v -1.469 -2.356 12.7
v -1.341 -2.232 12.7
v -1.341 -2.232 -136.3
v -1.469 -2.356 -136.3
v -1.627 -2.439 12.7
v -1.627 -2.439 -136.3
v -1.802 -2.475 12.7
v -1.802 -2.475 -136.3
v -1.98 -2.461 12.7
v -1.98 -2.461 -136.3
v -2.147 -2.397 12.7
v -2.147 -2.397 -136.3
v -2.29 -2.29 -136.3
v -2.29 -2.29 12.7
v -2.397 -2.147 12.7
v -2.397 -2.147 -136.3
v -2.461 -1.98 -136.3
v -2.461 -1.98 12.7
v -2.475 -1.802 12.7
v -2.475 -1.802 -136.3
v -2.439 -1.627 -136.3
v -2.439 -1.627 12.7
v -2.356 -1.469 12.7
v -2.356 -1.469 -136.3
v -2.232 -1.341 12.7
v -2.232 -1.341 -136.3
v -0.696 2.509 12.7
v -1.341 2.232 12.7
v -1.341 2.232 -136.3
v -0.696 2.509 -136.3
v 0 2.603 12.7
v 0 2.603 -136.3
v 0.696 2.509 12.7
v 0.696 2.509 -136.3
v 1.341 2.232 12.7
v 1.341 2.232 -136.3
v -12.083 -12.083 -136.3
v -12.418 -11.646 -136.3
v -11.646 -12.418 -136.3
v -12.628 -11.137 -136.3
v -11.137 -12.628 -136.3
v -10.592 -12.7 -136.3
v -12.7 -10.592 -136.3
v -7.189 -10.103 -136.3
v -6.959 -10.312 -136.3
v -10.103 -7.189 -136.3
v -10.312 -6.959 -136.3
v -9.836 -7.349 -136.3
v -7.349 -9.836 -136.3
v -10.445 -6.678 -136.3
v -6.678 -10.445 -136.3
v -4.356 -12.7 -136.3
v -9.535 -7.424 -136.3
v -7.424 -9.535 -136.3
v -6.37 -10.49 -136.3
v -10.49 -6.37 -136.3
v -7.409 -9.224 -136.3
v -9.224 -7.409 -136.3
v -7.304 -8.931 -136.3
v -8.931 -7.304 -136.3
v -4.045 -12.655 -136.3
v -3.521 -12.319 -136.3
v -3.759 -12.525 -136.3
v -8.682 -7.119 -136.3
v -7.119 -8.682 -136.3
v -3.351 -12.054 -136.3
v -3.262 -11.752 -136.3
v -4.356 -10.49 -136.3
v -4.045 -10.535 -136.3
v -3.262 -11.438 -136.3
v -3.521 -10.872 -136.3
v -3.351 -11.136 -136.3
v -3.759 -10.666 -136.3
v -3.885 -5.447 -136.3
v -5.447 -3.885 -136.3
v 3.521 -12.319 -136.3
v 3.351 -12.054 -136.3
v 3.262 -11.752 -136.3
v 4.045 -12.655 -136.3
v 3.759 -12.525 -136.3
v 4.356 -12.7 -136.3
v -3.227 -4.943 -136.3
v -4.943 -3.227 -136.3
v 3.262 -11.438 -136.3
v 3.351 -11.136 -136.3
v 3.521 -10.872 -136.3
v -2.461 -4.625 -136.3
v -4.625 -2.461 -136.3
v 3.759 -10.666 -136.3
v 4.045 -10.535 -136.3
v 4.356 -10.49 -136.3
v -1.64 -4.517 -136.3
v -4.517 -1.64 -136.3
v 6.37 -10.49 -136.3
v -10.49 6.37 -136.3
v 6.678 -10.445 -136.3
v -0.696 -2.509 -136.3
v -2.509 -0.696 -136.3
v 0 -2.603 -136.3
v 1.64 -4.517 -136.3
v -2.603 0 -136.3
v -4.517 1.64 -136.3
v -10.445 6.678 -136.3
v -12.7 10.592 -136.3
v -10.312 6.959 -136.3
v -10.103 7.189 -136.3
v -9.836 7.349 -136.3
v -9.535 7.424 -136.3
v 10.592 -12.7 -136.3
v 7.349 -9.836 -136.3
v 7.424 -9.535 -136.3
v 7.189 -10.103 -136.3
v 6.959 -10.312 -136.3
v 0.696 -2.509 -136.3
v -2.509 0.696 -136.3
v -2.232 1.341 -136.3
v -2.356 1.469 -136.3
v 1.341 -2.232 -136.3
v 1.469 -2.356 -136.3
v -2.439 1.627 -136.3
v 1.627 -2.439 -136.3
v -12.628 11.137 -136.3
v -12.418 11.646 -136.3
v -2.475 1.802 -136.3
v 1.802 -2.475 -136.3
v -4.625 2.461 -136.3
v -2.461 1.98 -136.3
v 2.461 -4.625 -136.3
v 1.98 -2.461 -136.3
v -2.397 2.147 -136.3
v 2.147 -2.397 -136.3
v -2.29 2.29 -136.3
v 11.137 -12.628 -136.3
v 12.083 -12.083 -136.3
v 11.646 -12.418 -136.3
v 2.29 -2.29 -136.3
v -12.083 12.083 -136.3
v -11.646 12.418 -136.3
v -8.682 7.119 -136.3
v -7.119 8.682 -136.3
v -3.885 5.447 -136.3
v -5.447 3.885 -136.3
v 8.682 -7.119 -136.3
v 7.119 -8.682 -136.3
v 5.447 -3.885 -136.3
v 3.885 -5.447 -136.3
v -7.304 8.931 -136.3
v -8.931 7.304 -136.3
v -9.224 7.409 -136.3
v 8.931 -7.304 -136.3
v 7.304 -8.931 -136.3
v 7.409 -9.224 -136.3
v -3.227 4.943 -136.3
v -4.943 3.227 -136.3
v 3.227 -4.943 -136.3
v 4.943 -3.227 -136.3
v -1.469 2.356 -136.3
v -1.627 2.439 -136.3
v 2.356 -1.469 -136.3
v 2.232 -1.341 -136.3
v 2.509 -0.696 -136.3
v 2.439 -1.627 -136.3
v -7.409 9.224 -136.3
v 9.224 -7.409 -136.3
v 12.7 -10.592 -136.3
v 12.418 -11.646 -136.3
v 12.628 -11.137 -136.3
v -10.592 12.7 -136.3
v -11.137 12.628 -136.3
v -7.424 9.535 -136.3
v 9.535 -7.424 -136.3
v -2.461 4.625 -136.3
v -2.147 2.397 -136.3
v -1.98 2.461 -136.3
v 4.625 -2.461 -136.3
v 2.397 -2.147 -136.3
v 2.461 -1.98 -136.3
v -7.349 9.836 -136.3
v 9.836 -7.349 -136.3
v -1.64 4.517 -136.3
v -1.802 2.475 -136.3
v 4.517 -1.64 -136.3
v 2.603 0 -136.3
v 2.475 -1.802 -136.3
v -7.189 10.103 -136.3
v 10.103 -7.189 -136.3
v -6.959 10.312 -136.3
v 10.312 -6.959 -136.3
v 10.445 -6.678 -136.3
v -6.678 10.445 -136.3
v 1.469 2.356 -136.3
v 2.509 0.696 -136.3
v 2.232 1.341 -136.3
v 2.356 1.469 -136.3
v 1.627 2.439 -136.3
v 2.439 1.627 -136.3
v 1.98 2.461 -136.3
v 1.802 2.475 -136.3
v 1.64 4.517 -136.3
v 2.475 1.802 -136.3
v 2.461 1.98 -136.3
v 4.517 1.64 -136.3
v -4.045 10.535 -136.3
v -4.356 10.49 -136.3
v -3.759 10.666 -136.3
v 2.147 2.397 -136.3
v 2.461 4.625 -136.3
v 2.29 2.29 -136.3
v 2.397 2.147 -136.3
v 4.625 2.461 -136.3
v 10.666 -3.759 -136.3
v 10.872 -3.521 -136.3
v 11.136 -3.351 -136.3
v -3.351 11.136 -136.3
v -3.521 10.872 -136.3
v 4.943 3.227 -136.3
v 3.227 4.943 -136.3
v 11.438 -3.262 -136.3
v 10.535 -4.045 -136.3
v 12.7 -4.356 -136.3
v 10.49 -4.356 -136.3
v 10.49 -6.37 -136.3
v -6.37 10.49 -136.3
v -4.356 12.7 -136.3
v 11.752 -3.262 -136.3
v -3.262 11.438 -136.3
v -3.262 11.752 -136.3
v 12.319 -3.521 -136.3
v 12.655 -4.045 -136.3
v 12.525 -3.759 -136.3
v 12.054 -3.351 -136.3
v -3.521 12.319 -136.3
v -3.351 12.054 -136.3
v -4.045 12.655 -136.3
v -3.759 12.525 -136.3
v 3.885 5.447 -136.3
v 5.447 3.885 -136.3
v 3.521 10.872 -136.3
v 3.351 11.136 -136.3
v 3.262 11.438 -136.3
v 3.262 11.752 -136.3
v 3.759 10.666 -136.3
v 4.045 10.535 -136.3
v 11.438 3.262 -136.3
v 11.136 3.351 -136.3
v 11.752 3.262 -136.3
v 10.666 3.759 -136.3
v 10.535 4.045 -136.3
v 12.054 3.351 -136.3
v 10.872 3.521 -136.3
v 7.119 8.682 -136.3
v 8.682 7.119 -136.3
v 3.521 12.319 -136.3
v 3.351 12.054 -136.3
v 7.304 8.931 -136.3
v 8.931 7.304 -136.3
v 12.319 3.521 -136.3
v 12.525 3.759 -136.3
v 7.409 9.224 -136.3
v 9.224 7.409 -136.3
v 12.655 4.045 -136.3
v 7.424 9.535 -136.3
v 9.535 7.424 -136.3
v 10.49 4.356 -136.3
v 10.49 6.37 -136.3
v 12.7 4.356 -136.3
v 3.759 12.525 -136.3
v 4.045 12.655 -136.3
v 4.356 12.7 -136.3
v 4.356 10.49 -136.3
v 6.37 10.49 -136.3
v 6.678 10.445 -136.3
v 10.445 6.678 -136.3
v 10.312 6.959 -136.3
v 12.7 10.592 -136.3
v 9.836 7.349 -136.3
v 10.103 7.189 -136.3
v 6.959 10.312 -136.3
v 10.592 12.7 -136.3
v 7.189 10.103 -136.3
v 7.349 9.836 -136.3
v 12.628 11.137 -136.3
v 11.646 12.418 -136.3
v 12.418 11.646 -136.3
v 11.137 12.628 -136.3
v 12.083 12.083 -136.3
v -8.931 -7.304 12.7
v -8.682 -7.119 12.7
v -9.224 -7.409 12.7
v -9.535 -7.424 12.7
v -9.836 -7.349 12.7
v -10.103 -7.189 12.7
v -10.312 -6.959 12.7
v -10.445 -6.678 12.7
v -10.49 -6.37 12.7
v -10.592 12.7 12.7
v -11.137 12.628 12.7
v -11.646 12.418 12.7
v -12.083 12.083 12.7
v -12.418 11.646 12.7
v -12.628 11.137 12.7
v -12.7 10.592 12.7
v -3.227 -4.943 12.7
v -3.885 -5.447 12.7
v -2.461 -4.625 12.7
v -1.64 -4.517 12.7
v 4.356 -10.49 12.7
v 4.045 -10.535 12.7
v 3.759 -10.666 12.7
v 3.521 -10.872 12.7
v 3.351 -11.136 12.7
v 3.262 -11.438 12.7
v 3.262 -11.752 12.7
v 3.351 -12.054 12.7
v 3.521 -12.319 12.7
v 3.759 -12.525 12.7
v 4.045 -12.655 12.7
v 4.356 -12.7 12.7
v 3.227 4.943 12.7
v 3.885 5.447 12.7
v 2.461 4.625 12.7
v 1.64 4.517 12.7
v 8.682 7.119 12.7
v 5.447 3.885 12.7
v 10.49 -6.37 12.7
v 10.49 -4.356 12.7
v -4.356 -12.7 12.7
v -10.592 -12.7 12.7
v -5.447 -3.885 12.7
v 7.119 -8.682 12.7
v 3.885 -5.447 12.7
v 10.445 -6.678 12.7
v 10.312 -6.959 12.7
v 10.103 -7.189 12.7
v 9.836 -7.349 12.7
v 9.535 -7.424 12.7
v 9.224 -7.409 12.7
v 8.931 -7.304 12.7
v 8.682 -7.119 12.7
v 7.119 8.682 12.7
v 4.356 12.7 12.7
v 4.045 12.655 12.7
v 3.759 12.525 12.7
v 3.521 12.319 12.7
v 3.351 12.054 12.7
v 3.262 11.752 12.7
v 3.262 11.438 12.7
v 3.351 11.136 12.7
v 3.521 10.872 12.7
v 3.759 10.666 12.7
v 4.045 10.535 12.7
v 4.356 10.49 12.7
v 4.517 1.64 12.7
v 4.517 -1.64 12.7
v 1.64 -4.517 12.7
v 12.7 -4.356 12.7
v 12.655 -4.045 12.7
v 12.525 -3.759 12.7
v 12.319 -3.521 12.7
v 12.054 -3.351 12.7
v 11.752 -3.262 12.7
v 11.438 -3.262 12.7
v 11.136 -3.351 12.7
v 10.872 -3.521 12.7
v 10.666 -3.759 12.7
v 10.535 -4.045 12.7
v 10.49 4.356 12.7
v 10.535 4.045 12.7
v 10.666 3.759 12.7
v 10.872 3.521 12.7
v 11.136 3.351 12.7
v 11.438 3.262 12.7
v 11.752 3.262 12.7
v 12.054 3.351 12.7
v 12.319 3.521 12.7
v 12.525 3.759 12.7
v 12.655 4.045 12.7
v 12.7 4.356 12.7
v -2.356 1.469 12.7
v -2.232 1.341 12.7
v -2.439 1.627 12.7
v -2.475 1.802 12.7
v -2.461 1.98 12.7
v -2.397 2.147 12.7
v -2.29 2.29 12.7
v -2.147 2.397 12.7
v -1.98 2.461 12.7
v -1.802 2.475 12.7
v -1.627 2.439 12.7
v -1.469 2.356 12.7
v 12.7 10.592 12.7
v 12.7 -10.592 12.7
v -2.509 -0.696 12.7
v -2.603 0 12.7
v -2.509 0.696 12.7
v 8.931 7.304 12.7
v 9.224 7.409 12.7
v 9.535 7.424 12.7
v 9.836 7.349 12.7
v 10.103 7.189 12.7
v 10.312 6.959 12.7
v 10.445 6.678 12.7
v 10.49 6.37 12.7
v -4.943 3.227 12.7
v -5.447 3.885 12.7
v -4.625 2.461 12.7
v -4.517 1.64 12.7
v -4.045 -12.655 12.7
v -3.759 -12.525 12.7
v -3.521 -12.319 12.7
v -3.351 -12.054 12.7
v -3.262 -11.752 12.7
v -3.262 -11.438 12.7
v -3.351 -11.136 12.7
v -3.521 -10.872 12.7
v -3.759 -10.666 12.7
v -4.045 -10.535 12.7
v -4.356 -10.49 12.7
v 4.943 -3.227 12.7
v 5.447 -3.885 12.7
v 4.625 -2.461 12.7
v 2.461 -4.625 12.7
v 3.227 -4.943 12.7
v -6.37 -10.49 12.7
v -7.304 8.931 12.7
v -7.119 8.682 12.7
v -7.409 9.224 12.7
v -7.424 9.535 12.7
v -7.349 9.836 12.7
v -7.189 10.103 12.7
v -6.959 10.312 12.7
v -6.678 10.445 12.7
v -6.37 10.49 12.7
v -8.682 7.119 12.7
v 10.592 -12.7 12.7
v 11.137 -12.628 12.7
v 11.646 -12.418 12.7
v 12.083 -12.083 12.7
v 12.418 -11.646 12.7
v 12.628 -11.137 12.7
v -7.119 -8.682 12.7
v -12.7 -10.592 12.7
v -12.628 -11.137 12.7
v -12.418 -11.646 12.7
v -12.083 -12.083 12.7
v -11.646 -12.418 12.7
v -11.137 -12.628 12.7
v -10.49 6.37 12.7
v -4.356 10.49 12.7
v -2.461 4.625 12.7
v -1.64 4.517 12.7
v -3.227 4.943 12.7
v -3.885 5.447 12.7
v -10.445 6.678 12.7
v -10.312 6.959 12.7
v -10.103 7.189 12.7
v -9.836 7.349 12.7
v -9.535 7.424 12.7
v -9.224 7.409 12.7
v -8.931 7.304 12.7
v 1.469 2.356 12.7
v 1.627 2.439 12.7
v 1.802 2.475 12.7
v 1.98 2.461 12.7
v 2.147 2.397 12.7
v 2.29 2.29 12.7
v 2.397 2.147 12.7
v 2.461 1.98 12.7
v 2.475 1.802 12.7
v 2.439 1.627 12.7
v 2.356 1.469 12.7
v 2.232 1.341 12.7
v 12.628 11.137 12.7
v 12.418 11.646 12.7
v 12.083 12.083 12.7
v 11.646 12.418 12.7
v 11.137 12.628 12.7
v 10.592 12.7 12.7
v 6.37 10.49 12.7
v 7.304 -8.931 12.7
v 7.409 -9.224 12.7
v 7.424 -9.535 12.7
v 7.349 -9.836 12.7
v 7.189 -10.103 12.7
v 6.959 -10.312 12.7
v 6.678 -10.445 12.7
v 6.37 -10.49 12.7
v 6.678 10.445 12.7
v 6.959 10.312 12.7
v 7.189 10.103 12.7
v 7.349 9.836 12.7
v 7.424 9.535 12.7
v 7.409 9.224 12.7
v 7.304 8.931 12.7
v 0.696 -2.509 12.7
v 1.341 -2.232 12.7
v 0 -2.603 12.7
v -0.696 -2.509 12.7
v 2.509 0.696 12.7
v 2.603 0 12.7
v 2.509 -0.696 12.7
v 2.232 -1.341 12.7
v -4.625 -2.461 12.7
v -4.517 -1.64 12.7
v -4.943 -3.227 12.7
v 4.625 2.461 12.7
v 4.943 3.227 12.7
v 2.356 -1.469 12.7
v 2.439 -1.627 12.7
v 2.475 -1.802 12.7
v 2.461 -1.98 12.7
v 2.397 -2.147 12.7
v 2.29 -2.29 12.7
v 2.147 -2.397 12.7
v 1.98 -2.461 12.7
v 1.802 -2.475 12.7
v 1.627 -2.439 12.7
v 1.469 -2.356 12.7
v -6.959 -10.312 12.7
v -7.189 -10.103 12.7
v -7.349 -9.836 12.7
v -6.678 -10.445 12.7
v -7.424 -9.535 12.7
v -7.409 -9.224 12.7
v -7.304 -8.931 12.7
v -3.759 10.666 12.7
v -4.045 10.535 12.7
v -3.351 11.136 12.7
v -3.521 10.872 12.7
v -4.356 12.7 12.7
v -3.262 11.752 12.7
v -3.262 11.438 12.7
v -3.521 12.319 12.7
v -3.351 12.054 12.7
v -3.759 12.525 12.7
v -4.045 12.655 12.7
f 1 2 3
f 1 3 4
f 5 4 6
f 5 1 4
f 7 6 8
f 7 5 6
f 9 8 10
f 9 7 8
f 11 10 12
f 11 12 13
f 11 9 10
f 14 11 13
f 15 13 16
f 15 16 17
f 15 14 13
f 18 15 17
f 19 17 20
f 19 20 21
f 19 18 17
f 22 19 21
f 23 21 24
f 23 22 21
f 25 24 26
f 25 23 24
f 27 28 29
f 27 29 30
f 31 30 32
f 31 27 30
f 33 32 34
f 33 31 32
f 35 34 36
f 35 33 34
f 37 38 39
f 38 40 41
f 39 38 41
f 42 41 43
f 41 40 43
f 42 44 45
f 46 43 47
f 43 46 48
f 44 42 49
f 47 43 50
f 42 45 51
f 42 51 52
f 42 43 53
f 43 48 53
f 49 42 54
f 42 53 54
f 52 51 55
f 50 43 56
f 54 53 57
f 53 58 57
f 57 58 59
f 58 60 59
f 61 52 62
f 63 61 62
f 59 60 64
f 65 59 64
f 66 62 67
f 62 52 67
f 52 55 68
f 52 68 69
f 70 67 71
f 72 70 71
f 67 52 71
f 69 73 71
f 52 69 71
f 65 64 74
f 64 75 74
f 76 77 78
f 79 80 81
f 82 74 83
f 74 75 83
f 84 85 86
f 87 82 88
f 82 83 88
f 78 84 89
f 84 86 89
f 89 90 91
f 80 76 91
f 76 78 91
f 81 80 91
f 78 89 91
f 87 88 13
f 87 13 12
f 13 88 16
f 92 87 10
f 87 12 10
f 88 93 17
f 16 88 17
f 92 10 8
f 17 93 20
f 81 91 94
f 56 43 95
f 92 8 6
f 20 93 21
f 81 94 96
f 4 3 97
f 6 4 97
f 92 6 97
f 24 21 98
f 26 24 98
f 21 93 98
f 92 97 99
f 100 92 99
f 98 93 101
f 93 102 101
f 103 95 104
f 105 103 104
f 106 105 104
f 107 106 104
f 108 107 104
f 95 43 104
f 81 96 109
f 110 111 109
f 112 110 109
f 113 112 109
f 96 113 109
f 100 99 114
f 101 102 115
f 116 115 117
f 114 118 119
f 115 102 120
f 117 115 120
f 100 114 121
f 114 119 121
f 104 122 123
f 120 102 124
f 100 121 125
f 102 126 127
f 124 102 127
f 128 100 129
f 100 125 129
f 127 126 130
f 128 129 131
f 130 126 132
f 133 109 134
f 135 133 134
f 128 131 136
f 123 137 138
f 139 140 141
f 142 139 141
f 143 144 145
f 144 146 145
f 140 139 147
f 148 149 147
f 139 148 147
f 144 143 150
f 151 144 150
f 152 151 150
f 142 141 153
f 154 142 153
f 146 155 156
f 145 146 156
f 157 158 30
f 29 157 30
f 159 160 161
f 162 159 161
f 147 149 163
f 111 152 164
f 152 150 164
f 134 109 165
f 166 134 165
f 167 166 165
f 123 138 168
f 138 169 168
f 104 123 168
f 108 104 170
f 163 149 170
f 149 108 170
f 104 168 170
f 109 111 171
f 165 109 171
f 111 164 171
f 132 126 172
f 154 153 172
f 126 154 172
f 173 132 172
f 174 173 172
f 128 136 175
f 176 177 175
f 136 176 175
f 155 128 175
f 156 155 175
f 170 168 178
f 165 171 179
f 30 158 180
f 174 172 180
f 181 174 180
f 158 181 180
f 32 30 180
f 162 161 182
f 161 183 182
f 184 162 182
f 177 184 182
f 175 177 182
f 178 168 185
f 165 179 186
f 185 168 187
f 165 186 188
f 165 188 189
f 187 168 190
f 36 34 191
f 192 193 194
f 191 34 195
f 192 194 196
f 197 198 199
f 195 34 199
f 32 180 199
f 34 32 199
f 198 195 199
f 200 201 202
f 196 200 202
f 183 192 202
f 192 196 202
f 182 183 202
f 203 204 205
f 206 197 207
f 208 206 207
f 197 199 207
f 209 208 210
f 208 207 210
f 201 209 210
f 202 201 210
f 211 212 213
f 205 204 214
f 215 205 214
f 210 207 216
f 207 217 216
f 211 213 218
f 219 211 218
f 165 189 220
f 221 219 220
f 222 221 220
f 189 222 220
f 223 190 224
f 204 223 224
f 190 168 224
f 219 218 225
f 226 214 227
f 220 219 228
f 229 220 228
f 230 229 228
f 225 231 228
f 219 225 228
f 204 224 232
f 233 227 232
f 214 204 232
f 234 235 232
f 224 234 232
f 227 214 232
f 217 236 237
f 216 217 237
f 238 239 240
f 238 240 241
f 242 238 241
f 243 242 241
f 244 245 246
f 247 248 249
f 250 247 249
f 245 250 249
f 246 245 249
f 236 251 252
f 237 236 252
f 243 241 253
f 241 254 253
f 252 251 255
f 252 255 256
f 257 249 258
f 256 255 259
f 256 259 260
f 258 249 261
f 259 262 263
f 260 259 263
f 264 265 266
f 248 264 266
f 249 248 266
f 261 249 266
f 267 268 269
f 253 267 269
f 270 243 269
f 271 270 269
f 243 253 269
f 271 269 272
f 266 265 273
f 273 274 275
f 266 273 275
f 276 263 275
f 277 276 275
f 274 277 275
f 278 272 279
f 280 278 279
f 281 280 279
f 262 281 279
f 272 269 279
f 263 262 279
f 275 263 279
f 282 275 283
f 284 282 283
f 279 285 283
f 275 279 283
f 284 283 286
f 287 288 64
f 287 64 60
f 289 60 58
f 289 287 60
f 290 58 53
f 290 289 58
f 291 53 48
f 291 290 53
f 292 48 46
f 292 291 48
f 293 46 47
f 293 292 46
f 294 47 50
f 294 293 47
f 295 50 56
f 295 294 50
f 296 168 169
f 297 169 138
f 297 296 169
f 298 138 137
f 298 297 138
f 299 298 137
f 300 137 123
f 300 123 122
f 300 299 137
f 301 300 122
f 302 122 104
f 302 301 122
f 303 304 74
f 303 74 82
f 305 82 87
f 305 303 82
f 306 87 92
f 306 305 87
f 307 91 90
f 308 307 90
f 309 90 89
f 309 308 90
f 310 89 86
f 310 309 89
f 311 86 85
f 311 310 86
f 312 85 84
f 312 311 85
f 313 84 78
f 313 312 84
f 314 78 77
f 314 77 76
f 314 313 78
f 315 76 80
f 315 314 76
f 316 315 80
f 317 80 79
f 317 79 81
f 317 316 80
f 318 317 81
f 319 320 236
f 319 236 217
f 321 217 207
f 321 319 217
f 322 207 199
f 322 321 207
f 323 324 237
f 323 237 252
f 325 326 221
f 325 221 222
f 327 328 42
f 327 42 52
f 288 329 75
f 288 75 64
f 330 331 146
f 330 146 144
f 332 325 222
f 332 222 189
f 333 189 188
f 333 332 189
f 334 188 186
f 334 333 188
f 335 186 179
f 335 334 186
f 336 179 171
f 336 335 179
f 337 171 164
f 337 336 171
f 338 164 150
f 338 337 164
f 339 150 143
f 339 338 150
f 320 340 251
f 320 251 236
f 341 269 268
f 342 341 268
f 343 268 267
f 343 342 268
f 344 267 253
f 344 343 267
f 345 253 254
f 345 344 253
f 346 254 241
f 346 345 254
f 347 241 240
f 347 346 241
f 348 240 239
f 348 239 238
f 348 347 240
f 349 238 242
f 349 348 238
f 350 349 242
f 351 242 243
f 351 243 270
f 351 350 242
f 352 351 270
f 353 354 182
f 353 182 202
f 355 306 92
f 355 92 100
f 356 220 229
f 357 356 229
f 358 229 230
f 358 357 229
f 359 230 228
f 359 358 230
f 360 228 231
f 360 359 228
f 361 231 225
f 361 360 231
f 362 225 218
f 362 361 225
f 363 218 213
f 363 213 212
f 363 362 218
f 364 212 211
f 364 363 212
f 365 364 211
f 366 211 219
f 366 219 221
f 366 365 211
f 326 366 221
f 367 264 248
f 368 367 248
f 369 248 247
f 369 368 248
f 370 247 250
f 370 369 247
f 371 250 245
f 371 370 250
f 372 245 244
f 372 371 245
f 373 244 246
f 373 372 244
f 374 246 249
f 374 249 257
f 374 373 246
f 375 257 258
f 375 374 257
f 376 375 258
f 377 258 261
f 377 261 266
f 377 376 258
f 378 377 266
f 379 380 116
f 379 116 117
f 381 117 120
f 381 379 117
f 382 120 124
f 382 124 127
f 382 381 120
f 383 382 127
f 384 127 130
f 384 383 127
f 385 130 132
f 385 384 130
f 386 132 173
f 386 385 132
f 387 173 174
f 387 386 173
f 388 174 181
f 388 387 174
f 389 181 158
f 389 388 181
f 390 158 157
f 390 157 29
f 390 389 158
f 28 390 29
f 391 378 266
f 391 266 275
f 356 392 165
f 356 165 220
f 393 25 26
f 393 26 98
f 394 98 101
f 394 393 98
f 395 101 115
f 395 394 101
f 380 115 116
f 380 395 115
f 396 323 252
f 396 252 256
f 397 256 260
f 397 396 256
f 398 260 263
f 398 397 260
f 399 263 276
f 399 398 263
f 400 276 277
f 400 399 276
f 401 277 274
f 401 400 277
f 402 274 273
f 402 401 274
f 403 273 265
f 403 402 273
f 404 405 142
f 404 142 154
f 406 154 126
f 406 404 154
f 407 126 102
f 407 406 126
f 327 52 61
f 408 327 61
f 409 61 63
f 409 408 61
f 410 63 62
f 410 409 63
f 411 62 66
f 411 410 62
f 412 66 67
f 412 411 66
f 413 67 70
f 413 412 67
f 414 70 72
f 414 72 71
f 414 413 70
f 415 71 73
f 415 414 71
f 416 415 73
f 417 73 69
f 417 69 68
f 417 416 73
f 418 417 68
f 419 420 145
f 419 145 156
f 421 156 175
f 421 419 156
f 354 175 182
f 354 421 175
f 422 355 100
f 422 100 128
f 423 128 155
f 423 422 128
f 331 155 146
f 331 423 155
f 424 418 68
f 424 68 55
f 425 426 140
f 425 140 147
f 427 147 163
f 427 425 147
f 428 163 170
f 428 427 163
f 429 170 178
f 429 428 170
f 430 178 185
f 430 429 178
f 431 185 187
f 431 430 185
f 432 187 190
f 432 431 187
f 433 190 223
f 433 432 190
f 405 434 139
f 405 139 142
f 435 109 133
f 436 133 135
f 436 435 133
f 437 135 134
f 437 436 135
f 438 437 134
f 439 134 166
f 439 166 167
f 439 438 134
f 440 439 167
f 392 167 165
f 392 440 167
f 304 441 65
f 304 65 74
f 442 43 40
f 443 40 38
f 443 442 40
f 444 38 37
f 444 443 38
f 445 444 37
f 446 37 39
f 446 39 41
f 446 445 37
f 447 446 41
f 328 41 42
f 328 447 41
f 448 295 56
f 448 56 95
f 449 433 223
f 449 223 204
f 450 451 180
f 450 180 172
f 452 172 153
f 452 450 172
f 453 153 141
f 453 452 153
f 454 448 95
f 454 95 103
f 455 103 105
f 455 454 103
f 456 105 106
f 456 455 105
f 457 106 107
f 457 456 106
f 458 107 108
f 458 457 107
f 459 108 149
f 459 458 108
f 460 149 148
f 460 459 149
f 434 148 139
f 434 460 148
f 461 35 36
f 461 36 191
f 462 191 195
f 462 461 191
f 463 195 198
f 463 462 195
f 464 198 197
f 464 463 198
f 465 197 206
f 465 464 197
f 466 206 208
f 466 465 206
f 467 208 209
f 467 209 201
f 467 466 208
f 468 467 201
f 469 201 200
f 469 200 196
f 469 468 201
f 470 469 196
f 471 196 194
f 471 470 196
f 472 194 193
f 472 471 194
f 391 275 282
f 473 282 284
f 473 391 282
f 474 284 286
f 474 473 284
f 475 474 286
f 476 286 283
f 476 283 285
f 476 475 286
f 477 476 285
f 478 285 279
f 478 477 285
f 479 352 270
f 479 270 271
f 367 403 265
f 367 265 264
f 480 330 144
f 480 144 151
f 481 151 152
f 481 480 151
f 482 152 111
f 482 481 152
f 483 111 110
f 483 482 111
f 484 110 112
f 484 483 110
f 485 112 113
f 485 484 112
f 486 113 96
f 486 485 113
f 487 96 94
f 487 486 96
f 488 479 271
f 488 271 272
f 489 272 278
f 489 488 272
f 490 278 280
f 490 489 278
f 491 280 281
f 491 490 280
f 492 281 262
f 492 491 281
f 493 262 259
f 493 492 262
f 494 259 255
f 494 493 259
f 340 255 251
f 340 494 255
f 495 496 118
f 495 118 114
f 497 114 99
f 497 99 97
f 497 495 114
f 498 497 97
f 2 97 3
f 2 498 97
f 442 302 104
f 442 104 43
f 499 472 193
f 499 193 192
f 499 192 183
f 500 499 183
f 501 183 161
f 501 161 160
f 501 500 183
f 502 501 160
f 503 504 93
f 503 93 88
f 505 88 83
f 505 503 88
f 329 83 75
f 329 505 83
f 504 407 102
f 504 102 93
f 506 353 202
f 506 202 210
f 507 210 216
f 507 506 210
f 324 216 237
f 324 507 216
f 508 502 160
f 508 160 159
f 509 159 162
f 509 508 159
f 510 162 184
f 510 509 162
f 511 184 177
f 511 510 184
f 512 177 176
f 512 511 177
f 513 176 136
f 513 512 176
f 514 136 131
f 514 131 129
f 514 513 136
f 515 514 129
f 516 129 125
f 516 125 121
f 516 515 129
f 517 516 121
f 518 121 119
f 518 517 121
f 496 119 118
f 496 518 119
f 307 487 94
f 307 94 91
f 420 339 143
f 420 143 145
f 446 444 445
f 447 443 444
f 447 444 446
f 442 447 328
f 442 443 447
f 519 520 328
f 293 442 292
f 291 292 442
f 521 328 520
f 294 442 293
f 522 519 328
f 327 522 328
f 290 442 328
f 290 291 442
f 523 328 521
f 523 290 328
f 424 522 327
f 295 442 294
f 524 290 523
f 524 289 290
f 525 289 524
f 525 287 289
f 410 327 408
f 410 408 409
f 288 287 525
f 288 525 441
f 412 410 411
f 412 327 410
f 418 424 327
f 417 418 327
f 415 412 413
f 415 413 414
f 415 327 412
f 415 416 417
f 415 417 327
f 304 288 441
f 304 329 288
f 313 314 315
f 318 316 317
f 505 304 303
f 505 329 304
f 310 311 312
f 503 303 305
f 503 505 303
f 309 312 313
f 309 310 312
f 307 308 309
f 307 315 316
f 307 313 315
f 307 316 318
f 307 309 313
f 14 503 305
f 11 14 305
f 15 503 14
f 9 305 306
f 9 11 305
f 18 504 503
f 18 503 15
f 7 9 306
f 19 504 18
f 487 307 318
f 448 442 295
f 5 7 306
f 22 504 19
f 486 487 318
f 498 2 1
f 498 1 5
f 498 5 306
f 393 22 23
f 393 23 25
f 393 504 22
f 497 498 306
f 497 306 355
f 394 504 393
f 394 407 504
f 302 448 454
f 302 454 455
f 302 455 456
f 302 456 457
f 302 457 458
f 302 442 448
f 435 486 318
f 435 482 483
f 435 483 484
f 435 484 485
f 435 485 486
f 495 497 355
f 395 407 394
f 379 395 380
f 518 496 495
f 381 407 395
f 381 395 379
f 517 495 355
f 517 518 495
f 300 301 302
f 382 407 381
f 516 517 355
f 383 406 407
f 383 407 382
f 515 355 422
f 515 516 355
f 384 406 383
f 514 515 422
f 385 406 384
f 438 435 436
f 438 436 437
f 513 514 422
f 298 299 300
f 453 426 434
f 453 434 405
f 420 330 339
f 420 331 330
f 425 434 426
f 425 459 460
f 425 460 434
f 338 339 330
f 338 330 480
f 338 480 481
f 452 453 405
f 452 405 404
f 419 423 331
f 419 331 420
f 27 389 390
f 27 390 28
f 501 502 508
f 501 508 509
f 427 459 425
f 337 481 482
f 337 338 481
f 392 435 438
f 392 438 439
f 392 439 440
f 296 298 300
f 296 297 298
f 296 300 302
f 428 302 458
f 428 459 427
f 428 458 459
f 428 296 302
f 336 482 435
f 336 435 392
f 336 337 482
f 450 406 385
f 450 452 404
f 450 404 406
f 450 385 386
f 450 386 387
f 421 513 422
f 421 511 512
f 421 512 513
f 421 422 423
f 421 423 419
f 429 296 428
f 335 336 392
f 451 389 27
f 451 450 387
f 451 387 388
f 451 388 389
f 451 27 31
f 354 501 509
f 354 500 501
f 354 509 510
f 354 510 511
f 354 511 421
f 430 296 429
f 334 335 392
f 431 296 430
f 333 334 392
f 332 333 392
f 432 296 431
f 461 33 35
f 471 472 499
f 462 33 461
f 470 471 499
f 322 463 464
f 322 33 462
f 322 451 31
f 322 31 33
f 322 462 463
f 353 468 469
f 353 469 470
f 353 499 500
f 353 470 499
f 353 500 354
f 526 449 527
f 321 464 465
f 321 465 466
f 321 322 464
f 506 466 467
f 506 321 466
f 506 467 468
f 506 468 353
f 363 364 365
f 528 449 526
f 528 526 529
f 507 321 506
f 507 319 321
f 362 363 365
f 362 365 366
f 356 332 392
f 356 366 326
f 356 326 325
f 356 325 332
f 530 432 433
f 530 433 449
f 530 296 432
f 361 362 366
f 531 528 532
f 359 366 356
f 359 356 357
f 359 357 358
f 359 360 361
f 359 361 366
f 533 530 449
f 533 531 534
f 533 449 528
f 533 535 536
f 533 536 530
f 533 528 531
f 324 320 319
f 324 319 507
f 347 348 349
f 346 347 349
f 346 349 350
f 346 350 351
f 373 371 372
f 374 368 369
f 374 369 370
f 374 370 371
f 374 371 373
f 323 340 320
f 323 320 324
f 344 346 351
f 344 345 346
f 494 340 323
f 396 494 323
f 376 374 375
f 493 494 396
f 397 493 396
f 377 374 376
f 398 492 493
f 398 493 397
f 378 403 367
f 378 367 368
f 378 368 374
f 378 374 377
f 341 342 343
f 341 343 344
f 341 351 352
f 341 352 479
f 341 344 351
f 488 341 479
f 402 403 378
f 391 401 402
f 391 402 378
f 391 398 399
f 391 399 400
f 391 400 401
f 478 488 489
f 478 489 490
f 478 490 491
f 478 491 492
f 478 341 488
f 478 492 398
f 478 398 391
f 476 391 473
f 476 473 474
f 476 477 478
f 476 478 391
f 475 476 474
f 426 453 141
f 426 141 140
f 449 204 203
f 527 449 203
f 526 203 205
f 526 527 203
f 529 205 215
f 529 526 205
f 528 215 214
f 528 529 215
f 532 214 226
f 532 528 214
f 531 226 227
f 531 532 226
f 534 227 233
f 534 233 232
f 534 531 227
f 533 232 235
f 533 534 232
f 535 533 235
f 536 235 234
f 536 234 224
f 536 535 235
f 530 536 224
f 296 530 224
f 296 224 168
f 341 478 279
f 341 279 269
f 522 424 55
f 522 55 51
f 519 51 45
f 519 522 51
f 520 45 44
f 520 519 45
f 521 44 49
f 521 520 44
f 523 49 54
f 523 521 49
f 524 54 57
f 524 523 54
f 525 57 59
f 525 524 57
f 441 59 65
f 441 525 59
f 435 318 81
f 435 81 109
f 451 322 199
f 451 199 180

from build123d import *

# Parameters (mm, degrees)
BOSS_EXTRUDE1_DEPTH = 149


with BuildPart() as part:
    # Sketch1 → Boss-Extrude1 (new body)
    with BuildSketch(Plane.XY.offset(12.7)):
        with BuildLine():
            Line((-12.7, 10.5918), (-12.7, -10.5918))
            ThreePointArc((-12.7, -10.5918), (-12.082522516, -12.082522516), (-10.5918, -12.7))
            Line((-10.5918, -12.7), (-4.3561, -12.7))
            ThreePointArc((-4.3561, -12.7), (-3.2512, -11.5951), (-4.3561, -10.4902))
            Line((-4.3561, -10.4902), (-6.370083784, -10.4902))
            ThreePointArc((-6.370083784, -10.4902), (-7.34885674, -9.836204819), (-7.119204173, -8.681663397))
            Line((-7.119204173, -8.681663397), (-3.884643888, -5.447103113))
            ThreePointArc((-3.884643888, -5.447103113), (-2.854599756, -4.758849627), (-1.639579858, -4.517167143))
            Line((-1.639579858, -4.517167143), (1.639579858, -4.517167143))
            ThreePointArc((1.639579858, -4.517167143), (2.854599756, -4.758849627), (3.884643888, -5.447103113))
            Line((3.884643888, -5.447103113), (7.119204173, -8.681663397))
            ThreePointArc((7.119204173, -8.681663397), (7.34885674, -9.836204819), (6.370083784, -10.4902))
            Line((6.370083784, -10.4902), (4.356099789, -10.4902))
            ThreePointArc((4.356099789, -10.4902), (3.251199789, -11.5951), (4.356099789, -12.7))
            Line((4.356099789, -12.7), (10.5918, -12.7))
            ThreePointArc((10.5918, -12.7), (12.082522516, -12.082522516), (12.7, -10.5918))
            Line((12.7, -10.5918), (12.7, -4.3561))
            ThreePointArc((12.7, -4.3561), (11.5951, -3.2512), (10.4902, -4.3561))
            Line((10.4902, -4.3561), (10.4902, -6.370083784))
            ThreePointArc((10.4902, -6.370083784), (9.836204819, -7.34885674), (8.681663397, -7.119204173))
            Line((8.681663397, -7.119204173), (5.447103113, -3.884643888))
            ThreePointArc((5.447103113, -3.884643888), (4.758849627, -2.854599756), (4.517167143, -1.639579858))
            Line((4.517167143, -1.639579858), (4.517167143, 1.639579858))
            ThreePointArc((4.517167143, 1.639579858), (4.758849627, 2.854599756), (5.447103113, 3.884643888))
            Line((5.447103113, 3.884643888), (8.681663397, 7.119204173))
            ThreePointArc((8.681663397, 7.119204173), (9.836204819, 7.34885674), (10.4902, 6.370083784))
            Line((10.4902, 6.370083784), (10.4902, 4.3561))
            ThreePointArc((10.4902, 4.3561), (11.5951, 3.2512), (12.7, 4.3561))
            Line((12.7, 4.3561), (12.7, 10.5918))
            ThreePointArc((12.7, 10.5918), (12.082522516, 12.082522516), (10.5918, 12.7))
            Line((10.5918, 12.7), (4.3561, 12.7))
            ThreePointArc((4.3561, 12.7), (3.2512, 11.5951), (4.3561, 10.4902))
            Line((4.3561, 10.4902), (6.370083784, 10.4902))
            ThreePointArc((6.370083784, 10.4902), (7.34885674, 9.836204819), (7.119204173, 8.681663397))
            Line((7.119204173, 8.681663397), (3.884643888, 5.447103113))
            ThreePointArc((3.884643888, 5.447103113), (2.854599756, 4.758849627), (1.639579858, 4.517167143))
            Line((1.639579858, 4.517167143), (-1.639579858, 4.517167143))
            ThreePointArc((-1.639579858, 4.517167143), (-2.854599756, 4.758849627), (-3.884643888, 5.447103113))
            Line((-3.884643888, 5.447103113), (-7.119204173, 8.681663397))
            ThreePointArc((-7.119204173, 8.681663397), (-7.34885674, 9.836204819), (-6.370083784, 10.4902))
            Line((-6.370083784, 10.4902), (-4.356099789, 10.4902))
            ThreePointArc((-4.356099789, 10.4902), (-3.251199789, 11.5951), (-4.356099789, 12.7))
            Line((-4.356099789, 12.7), (-10.5918, 12.7))
            ThreePointArc((-10.5918, 12.7), (-12.082522516, 12.082522516), (-12.7, 10.5918))
        make_face()
        with BuildLine():
            Line((-8.681663397, 7.119204173), (-5.447103113, 3.884643888))
            ThreePointArc((-5.447103113, 3.884643888), (-4.758849627, 2.854599756), (-4.517167143, 1.639579858))
            Line((-4.517167143, 1.639579858), (-4.517167143, -1.639579858))
            ThreePointArc((-4.517167143, -1.639579858), (-4.758849627, -2.854599756), (-5.447103113, -3.884643888))
            Line((-5.447103113, -3.884643888), (-8.681663397, -7.119204173))
            ThreePointArc((-8.681663397, -7.119204173), (-9.836204819, -7.34885674), (-10.4902, -6.370083784))
            Line((-10.4902, -6.370083784), (-10.4902, 6.370083784))
            ThreePointArc((-10.4902, 6.370083784), (-9.836204819, 7.34885674), (-8.681663397, 7.119204173))
        make_face(mode=Mode.SUBTRACT)
        with BuildLine():
            ThreePointArc((-2.231856261, 1.340533427), (-2.28996531, 2.28996531), (-1.340533427, 2.231856261))
            ThreePointArc((-1.340533427, 2.231856261), (-1.1e-08, 2.603499998), (1.340533408, 2.231856273))
            ThreePointArc((1.340533408, 2.231856273), (2.28996531, 2.28996533), (2.231856262, 1.340533427))
            ThreePointArc((2.231856262, 1.340533427), (2.603499999, 1.1e-08), (2.231856274, -1.340533408))
            ThreePointArc((2.231856274, -1.340533408), (2.289965331, -2.28996531), (1.340533428, -2.231856262))
            ThreePointArc((1.340533428, -2.231856262), (6e-09, -2.603499999), (-1.340533417, -2.231856268))
            ThreePointArc((-1.340533417, -2.231856268), (-2.28996532, -2.28996532), (-2.231856267, -1.340533417))
            ThreePointArc((-2.231856267, -1.340533417), (-2.603499998, 6e-09), (-2.231856261, 1.340533427))
        make_face(mode=Mode.SUBTRACT)
    extrude(amount=-BOSS_EXTRUDE1_DEPTH)


solid = part.part
